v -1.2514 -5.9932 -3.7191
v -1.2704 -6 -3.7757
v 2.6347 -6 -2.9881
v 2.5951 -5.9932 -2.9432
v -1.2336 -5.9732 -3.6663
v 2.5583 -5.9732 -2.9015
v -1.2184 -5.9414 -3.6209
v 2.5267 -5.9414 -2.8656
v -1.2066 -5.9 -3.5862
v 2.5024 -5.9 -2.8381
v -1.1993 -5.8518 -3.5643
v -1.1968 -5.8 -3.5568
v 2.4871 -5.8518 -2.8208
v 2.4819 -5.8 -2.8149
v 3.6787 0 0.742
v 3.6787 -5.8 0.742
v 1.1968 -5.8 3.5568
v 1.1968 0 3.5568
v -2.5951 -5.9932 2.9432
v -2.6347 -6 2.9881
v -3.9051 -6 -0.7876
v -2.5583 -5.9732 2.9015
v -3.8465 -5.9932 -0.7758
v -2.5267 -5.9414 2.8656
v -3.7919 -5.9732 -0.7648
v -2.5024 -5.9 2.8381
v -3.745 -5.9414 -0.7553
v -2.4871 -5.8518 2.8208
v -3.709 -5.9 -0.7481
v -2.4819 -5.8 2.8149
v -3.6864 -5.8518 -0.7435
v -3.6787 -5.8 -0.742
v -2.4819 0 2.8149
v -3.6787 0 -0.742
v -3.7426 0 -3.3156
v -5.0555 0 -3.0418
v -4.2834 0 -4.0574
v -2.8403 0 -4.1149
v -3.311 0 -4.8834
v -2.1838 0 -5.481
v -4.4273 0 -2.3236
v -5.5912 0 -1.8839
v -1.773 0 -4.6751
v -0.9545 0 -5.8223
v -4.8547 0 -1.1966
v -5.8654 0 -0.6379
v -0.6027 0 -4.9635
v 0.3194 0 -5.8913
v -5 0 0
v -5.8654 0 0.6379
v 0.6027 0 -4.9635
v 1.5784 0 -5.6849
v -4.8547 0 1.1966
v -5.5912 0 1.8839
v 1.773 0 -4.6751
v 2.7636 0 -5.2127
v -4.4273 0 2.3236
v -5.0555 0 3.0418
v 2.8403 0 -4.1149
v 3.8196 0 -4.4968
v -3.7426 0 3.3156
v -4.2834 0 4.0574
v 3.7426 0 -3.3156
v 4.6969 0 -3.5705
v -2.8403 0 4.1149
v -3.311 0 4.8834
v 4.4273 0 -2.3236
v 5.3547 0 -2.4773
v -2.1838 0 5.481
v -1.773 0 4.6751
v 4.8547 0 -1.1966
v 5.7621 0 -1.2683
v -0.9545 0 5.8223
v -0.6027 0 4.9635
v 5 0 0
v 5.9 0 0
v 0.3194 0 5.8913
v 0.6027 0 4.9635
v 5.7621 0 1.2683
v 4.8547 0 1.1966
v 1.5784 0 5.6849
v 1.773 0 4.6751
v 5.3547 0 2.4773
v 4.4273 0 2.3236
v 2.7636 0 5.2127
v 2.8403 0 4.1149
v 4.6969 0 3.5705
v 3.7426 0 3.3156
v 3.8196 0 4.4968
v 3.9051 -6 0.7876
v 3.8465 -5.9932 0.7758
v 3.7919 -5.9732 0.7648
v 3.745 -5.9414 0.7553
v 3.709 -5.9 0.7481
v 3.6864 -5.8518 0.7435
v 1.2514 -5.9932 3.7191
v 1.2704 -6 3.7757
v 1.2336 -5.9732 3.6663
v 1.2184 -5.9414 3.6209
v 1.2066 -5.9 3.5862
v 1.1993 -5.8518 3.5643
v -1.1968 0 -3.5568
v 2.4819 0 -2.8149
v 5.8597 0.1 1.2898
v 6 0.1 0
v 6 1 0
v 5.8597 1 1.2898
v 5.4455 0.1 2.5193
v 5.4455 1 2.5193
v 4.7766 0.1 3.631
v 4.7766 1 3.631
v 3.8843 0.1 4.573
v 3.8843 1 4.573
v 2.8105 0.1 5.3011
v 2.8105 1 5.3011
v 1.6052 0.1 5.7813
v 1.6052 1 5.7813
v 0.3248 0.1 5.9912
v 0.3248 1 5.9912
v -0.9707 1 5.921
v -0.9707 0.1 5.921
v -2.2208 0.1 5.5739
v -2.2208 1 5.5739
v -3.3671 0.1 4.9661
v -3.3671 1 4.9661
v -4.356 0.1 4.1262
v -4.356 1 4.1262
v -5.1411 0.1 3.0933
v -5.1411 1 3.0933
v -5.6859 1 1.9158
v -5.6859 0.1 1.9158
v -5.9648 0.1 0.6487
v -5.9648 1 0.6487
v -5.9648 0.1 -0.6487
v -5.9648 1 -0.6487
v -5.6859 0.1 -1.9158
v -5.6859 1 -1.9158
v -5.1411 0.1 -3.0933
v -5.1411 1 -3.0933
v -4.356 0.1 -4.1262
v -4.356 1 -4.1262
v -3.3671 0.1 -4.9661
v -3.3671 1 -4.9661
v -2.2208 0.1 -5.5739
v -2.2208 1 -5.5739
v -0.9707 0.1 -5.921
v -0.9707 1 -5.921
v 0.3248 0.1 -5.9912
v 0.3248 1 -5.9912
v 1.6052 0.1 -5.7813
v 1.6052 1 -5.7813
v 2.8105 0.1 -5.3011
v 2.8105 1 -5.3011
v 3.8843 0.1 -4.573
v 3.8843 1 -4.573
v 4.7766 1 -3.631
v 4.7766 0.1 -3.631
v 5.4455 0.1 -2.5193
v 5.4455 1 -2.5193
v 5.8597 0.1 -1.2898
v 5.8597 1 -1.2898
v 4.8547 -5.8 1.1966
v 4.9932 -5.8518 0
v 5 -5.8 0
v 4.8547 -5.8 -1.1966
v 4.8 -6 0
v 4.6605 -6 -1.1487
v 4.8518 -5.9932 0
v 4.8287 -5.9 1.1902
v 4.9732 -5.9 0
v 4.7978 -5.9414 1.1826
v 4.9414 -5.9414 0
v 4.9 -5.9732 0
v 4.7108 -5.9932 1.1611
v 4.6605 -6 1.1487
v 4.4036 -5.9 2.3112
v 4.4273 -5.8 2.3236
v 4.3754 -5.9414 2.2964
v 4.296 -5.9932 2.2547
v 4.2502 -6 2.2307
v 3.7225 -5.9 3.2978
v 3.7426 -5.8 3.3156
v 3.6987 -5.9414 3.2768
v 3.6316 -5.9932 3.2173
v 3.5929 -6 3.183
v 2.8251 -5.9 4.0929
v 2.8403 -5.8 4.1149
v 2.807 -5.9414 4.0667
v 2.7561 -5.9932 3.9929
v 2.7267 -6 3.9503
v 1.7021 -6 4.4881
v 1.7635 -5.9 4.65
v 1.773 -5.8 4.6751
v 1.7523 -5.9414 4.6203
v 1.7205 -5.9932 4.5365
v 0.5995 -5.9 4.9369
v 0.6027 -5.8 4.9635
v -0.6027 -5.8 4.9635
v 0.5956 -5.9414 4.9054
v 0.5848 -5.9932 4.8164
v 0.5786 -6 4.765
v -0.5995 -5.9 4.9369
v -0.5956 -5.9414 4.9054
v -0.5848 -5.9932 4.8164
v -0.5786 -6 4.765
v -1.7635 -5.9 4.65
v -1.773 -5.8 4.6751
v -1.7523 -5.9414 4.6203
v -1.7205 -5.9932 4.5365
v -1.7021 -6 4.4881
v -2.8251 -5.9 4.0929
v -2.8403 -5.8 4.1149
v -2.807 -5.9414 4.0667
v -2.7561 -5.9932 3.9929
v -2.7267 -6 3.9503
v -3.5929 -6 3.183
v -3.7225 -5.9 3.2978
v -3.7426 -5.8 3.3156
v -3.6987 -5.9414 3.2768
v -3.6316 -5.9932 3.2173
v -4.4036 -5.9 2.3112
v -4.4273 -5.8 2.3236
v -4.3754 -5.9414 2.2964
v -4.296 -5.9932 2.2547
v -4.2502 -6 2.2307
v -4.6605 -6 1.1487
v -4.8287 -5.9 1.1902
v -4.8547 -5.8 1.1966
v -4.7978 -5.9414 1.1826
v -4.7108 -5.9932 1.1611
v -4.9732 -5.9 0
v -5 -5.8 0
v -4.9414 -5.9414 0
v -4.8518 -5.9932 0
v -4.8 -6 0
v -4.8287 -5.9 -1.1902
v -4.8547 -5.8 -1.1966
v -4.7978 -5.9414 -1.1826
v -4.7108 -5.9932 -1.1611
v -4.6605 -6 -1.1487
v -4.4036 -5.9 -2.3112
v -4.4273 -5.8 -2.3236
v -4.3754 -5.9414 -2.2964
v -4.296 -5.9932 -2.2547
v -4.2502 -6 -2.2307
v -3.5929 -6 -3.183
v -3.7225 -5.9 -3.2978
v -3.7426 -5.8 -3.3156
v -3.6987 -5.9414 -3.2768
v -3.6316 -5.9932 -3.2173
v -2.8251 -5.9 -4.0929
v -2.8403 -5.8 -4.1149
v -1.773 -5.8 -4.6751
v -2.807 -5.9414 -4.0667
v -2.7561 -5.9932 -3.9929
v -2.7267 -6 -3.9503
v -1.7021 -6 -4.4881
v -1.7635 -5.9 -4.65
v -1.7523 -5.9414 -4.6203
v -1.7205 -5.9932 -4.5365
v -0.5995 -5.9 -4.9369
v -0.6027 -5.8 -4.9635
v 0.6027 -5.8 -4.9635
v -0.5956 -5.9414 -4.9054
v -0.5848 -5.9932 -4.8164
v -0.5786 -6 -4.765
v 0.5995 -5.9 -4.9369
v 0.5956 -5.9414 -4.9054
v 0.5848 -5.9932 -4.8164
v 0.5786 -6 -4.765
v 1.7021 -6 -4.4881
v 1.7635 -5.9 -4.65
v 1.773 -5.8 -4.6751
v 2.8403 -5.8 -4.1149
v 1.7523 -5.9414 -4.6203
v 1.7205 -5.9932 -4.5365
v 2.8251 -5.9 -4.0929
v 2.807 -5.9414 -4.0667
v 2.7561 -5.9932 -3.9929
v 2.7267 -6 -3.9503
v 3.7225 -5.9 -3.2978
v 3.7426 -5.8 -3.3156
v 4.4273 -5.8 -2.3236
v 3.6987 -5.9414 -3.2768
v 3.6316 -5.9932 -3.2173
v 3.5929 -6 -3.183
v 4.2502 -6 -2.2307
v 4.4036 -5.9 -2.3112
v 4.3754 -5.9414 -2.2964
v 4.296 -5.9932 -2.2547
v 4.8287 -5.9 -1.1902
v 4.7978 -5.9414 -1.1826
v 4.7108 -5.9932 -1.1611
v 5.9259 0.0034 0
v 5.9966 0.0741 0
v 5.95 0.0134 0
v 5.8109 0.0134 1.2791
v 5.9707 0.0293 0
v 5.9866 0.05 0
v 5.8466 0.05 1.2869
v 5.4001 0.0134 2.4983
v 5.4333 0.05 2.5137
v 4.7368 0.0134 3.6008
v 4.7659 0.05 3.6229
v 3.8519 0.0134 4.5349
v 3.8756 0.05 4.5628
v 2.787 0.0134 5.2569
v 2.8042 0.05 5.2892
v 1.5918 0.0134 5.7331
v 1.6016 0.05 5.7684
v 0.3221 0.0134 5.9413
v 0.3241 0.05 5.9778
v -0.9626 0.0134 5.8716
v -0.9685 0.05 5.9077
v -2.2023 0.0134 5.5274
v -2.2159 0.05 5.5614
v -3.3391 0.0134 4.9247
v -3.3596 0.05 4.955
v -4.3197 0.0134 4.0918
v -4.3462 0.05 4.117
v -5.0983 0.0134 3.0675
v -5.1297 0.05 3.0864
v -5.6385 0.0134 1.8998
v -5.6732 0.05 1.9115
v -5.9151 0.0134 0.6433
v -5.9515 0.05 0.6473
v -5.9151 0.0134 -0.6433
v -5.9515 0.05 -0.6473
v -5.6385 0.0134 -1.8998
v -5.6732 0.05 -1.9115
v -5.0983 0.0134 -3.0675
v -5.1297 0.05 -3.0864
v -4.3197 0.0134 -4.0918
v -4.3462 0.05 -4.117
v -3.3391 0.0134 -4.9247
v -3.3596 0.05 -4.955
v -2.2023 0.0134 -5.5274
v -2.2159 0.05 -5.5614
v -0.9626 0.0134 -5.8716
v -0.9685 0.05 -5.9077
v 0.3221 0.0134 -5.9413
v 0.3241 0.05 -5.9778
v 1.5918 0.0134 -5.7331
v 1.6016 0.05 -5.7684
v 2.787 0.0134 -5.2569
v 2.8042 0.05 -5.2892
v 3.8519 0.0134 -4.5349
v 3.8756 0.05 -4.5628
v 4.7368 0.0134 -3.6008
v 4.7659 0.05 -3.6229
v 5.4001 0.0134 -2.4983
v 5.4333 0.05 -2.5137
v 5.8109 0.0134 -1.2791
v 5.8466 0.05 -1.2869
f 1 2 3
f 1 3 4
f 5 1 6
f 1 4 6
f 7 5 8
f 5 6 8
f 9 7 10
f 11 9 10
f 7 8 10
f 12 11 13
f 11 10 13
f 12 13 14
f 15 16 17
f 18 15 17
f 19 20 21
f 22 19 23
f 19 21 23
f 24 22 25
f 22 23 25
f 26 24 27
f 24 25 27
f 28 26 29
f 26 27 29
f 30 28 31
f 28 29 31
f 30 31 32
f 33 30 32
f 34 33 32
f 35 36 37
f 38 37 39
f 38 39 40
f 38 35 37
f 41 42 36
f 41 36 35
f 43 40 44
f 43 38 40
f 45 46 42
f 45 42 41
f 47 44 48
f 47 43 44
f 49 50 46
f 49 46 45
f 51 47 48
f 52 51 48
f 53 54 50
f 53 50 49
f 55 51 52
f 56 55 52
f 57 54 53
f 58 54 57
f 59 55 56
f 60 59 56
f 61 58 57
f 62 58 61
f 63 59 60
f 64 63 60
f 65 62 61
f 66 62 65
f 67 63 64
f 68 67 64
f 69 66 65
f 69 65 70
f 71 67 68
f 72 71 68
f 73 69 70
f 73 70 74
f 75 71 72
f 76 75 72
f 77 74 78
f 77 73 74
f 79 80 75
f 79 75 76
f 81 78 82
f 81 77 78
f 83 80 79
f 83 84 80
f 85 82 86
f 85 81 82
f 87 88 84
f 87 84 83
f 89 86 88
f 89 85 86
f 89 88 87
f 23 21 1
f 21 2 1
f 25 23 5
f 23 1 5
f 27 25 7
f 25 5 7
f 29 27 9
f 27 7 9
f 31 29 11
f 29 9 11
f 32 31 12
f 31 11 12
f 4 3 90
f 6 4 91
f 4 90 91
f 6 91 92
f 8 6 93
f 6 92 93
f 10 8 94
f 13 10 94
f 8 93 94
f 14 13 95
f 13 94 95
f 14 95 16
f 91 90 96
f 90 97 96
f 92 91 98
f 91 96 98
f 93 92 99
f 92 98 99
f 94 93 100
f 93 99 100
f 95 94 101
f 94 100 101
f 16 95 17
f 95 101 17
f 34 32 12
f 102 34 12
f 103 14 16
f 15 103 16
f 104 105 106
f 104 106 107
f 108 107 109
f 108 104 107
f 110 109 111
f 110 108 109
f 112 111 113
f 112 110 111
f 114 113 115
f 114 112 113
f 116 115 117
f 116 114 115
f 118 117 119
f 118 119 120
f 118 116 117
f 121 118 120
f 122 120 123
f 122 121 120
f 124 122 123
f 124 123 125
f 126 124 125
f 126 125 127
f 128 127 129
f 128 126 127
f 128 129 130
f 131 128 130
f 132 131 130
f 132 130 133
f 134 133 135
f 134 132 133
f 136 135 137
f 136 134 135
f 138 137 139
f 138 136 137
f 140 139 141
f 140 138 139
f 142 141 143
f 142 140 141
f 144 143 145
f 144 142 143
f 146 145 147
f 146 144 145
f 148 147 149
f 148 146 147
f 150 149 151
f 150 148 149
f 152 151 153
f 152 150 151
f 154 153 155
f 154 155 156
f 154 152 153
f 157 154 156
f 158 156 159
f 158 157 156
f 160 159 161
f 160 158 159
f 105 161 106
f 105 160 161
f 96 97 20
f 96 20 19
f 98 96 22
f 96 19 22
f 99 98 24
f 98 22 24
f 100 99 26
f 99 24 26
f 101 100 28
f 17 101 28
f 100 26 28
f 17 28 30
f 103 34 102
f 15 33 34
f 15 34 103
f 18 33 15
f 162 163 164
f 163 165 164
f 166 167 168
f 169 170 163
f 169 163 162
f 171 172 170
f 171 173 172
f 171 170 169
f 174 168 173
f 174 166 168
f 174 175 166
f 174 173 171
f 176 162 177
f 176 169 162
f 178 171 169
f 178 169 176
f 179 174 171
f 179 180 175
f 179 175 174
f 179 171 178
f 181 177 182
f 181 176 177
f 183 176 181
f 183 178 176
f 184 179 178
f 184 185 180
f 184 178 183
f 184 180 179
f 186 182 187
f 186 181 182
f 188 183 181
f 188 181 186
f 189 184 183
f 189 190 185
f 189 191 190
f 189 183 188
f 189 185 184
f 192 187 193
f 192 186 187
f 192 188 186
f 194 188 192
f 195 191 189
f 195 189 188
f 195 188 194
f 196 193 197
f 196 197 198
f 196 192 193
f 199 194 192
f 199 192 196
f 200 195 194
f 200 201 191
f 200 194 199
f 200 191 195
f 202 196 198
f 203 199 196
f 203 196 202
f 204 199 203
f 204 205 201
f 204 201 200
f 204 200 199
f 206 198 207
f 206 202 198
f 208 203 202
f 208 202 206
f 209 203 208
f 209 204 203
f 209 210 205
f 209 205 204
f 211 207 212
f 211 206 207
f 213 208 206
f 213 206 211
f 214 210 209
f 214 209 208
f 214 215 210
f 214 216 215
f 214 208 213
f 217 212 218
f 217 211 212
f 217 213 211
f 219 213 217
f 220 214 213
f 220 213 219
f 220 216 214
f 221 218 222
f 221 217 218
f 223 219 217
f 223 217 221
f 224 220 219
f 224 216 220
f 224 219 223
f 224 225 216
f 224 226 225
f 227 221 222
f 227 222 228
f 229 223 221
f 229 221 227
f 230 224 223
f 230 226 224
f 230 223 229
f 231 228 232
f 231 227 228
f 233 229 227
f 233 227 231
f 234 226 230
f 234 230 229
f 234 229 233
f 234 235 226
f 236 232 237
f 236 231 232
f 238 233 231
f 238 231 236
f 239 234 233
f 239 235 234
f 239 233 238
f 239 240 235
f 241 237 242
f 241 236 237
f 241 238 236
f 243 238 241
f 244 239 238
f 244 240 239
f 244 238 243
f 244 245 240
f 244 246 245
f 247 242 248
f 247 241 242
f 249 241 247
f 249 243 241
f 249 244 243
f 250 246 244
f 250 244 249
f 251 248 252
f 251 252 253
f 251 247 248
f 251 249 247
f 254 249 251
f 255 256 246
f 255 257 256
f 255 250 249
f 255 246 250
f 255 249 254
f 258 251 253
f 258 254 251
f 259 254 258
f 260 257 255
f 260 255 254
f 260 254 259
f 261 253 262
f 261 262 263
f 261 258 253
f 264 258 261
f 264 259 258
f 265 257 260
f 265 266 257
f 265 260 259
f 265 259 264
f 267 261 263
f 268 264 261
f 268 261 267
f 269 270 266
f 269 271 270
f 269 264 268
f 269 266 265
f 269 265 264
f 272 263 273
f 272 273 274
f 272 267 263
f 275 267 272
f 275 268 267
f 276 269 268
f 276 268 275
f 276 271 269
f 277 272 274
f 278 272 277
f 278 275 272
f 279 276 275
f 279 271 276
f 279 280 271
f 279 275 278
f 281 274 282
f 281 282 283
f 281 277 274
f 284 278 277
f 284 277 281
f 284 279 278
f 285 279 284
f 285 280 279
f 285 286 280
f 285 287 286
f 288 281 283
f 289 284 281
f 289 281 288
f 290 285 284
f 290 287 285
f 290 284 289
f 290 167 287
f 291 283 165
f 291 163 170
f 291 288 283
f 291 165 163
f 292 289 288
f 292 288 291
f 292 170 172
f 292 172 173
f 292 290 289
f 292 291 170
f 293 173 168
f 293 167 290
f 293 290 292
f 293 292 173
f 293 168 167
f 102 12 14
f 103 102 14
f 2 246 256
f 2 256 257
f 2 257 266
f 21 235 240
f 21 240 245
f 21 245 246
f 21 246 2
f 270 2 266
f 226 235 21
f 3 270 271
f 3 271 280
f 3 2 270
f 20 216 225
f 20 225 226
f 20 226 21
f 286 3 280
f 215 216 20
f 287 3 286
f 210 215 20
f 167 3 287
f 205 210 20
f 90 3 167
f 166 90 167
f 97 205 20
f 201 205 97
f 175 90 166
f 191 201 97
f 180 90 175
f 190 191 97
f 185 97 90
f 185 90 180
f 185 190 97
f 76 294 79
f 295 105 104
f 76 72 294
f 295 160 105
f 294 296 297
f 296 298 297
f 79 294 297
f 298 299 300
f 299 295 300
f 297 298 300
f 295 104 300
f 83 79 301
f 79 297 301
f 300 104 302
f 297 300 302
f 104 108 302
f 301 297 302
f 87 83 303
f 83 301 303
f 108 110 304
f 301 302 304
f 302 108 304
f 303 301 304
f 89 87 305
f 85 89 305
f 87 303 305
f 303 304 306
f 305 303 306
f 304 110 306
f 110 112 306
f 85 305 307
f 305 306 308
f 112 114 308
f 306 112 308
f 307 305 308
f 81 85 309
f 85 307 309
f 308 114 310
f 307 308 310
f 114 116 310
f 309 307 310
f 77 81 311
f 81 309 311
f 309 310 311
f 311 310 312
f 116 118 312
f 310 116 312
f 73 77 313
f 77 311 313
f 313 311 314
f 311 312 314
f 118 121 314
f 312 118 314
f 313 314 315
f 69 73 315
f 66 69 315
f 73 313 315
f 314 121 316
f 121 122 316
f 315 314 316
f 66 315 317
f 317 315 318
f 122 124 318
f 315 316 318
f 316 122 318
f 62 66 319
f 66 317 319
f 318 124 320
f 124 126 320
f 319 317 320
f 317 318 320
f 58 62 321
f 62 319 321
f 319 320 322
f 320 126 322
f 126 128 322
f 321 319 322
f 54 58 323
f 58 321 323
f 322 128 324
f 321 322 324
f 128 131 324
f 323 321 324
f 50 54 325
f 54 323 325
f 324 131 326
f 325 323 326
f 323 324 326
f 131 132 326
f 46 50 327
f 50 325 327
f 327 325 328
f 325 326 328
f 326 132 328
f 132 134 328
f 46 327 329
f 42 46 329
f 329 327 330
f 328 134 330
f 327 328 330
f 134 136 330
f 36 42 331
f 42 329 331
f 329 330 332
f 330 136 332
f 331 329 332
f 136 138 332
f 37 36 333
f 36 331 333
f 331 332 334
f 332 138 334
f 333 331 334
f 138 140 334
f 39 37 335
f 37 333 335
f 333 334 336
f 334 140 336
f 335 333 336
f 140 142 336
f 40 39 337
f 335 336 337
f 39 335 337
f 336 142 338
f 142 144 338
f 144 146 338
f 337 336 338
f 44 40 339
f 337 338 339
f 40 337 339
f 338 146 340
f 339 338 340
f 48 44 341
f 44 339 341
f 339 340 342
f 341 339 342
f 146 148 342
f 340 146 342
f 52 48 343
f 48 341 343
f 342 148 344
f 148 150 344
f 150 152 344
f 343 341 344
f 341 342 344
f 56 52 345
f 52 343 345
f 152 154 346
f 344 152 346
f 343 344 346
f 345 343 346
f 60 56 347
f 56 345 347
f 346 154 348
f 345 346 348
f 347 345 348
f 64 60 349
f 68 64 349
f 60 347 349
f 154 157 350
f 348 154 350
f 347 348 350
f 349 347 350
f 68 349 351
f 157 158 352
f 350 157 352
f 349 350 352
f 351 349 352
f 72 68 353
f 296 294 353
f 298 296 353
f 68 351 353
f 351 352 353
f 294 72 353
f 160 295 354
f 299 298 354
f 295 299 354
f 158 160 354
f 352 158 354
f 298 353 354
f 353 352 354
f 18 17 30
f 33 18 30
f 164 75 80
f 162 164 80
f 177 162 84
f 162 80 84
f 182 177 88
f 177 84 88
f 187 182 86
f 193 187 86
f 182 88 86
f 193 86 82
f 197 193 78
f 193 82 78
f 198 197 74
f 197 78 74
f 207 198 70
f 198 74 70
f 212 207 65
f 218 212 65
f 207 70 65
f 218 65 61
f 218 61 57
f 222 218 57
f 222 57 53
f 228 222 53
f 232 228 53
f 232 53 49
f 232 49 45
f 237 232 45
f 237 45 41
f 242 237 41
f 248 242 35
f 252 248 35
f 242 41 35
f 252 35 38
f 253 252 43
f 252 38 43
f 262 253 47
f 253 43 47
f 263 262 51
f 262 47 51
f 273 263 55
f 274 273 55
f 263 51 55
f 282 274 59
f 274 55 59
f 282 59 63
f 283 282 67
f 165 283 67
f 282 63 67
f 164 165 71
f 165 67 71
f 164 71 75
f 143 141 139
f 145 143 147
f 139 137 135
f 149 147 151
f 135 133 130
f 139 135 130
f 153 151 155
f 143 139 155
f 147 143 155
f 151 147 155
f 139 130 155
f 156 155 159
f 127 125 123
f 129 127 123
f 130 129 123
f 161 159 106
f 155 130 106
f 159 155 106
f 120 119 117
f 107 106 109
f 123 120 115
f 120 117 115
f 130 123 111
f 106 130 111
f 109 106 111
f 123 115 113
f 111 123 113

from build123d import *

# Parameters (mm, degrees)
F0_R     = 6
F1_DEPTH = 1
F2_R     = 5
F3_DEPTH = 6
F5_DEPTH = 6
F6_R     = 0.2
F7_R     = 0.1


with BuildPart() as f1:
    # F0 (on Front) → F1 (new body)
    with BuildSketch(Plane.XZ):
        Circle(F0_R)
    extrude(amount=-F1_DEPTH)

    # F2 (on face) → F3 (join)
    with BuildSketch(Plane.XZ):
        Circle(F2_R)
    extrude(amount=F3_DEPTH)

    # F4 (on face) → F5 (cut)
    with BuildSketch(Plane.XZ.offset(6)):
        Polygon((3.6786964709, 0.7419741291), (1.1967797907, 3.5568316612), (-2.4819166802, 2.8148575321), (-3.6786964709, -0.7419741291), (-1.1967797907, -3.5568316612), (2.4819166802, -2.8148575321), align=None)
    extrude(amount=-F5_DEPTH, mode=Mode.SUBTRACT)

    # F6
    f6_edges = [f1.edges().sort_by_distance(p)[0] for p in [
        (-5, -6, 0),
        (0.642568, -6, -3.185845),
        (3.080307, -6, -1.036442),
        (2.437738, -6, 2.149403),
        (-0.642568, -6, 3.185845),
        (-3.080307, -6, 1.036442),
        (-2.437738, -6, -2.149403),
    ]]
    fillet(f6_edges, radius=F6_R)

    # F7
    f7_edges = [f1.edges().sort_by_distance(p)[0] for p in [
        (-6, 0, 0),
    ]]
    fillet(f7_edges, radius=F7_R)


solid = f1.part
